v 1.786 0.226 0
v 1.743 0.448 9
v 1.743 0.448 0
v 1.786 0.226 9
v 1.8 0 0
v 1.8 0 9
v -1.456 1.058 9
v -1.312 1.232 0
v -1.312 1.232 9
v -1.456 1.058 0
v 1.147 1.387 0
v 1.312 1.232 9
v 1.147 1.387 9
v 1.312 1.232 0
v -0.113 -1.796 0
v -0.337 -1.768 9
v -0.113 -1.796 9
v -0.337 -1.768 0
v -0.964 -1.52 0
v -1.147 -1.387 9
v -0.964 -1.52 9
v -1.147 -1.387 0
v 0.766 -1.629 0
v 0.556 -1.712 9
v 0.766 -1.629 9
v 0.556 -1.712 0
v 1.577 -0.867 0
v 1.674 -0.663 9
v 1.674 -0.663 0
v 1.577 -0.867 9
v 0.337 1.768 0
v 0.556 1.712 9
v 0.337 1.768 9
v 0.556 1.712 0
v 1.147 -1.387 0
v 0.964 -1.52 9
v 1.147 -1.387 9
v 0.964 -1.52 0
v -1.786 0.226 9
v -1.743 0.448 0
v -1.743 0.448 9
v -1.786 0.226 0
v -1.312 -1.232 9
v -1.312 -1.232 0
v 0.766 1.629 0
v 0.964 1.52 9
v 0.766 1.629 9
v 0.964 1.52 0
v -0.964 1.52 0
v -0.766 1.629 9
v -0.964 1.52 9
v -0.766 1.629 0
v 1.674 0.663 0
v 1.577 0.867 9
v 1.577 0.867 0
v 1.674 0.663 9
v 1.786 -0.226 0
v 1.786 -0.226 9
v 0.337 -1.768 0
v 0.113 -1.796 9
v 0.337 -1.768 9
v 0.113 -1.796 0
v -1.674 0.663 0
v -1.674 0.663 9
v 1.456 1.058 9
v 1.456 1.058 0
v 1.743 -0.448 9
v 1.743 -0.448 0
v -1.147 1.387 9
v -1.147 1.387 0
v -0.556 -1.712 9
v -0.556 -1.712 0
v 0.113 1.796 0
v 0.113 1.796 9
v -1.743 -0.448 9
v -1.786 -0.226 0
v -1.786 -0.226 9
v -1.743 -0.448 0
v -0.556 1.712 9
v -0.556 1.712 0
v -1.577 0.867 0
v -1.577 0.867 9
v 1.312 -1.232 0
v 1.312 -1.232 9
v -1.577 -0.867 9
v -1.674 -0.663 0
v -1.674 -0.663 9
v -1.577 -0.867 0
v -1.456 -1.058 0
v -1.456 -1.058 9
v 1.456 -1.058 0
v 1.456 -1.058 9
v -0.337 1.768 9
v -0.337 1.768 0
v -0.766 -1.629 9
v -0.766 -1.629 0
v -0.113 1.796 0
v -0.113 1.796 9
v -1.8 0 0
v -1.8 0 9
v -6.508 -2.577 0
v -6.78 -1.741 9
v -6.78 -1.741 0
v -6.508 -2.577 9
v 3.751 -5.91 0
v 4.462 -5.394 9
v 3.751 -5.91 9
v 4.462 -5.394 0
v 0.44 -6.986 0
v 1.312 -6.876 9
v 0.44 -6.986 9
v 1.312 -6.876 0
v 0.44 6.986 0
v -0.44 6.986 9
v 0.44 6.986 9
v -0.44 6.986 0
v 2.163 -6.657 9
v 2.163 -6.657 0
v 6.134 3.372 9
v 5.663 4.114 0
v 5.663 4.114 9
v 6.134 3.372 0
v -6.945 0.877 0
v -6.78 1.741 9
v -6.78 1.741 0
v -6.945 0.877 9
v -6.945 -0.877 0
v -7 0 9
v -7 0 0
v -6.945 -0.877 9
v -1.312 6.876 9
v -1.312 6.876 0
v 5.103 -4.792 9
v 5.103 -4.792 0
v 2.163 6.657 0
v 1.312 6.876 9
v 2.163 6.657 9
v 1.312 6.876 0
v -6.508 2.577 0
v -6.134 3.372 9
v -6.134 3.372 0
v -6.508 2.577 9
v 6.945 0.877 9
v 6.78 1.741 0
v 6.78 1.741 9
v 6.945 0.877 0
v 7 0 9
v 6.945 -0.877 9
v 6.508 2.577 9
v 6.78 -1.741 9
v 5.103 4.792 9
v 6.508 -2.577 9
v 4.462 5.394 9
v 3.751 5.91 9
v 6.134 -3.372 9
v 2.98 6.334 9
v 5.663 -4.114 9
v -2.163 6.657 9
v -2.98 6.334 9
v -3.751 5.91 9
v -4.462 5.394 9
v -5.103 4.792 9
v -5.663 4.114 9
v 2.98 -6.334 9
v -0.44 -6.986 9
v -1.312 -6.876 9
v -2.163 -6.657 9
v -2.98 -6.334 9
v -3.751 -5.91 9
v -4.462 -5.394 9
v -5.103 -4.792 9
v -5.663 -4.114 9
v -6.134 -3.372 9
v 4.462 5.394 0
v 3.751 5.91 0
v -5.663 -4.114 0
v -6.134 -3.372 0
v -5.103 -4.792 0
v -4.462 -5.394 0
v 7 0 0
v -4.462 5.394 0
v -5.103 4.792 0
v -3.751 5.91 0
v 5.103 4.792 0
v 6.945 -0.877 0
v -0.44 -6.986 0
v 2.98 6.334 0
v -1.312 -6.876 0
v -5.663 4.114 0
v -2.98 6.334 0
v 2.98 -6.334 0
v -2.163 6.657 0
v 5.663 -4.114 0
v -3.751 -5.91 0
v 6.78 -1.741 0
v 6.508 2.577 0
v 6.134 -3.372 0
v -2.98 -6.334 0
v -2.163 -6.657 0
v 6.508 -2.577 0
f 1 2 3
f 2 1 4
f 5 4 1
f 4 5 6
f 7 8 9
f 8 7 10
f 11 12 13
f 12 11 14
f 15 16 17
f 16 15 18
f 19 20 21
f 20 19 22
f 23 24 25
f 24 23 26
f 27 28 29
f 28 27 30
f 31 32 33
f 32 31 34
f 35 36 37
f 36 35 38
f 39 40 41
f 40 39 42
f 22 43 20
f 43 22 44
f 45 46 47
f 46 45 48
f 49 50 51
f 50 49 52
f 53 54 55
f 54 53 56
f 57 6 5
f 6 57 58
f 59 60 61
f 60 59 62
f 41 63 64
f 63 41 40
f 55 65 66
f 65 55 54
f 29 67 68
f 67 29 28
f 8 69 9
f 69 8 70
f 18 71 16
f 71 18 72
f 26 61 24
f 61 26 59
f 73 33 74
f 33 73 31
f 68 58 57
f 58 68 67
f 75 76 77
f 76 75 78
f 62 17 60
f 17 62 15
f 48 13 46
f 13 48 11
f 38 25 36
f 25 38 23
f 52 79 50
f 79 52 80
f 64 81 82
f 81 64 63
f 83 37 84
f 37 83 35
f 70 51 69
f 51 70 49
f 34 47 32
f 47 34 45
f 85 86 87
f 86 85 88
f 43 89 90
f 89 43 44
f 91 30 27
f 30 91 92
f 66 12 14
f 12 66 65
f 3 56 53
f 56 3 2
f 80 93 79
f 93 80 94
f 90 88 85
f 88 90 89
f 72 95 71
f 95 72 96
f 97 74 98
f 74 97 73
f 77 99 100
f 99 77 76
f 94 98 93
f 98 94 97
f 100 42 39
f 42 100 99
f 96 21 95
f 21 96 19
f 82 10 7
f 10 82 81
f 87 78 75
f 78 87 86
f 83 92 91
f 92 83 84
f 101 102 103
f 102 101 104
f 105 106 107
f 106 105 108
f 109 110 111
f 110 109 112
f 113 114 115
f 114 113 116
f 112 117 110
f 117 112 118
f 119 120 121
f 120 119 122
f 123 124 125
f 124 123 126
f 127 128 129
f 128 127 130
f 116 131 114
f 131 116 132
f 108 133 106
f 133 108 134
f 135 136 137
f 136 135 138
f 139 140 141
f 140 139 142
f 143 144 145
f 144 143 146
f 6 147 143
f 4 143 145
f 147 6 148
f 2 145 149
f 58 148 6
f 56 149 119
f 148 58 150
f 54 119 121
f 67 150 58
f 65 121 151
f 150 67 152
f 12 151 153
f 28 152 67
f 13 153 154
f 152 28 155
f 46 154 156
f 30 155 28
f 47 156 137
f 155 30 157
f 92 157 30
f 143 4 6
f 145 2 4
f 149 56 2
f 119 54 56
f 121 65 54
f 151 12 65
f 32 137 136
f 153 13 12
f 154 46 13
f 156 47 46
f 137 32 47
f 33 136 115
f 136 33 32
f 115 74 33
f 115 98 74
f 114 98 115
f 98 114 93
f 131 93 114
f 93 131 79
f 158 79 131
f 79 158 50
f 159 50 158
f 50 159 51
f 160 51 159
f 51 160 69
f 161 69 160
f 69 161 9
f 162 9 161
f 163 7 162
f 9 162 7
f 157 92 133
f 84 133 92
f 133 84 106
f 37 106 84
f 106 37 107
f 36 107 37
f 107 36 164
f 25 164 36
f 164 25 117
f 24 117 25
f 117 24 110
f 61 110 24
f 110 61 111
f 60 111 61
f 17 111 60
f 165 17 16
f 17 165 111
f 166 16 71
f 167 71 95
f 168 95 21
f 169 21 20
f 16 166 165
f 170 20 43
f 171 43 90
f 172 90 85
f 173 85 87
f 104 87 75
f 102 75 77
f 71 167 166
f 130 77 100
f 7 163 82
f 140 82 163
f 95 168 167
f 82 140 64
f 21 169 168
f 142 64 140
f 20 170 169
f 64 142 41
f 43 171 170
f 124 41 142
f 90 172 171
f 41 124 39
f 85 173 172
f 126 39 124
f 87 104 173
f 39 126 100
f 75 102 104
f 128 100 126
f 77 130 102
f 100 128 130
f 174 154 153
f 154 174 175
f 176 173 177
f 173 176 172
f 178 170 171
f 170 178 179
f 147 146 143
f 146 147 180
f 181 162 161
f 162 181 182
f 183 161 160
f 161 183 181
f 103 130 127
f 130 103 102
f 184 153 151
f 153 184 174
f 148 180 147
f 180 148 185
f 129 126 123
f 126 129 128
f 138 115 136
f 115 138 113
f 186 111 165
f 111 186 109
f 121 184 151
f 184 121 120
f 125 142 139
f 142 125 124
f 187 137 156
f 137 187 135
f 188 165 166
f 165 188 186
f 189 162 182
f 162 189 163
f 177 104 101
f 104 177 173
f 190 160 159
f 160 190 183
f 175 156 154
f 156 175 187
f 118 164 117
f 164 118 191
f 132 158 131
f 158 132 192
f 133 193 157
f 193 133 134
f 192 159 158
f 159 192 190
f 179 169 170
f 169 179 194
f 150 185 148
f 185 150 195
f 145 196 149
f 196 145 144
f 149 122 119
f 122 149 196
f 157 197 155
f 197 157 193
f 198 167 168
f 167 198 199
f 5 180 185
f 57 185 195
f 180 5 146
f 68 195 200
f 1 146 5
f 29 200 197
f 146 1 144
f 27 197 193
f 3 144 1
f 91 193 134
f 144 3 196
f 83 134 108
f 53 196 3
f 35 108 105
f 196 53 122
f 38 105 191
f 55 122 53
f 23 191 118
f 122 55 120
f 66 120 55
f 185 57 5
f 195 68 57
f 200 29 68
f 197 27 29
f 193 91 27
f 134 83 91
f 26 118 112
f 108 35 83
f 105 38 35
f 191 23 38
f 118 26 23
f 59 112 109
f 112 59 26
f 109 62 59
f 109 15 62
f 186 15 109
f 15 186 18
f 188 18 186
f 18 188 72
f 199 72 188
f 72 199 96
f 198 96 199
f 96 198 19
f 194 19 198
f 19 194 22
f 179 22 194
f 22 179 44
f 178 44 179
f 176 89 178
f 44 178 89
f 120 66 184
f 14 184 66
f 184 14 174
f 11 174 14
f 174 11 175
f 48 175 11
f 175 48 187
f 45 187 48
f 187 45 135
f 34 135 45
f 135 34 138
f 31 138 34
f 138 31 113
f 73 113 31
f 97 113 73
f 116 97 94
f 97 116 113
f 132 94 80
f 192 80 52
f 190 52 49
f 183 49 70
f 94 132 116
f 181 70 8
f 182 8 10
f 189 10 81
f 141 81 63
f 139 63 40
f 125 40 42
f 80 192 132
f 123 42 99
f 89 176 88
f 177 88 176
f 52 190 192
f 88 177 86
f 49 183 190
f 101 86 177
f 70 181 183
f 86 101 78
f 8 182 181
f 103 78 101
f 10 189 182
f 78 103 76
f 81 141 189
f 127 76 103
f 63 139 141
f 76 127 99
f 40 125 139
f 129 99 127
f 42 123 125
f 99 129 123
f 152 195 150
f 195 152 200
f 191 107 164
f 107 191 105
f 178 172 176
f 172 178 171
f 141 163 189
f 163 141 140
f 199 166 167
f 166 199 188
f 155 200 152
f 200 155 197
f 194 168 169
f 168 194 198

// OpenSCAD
$fn = 50;


difference() {
	union() {
		cylinder(h = 9, r = 7.0000000000);
	}
	union() {
		translate(v = [0.0000000000, 0.0000000000, -100.0000000000]) {
			cylinder(h = 200, r = 1.8000000000);
		}
		cylinder(h = 9, r = 1.8000000000);
		cylinder(h = 9, r = 1.8000000000);
		cylinder(h = 9, r = 1.8000000000);
	}
}
